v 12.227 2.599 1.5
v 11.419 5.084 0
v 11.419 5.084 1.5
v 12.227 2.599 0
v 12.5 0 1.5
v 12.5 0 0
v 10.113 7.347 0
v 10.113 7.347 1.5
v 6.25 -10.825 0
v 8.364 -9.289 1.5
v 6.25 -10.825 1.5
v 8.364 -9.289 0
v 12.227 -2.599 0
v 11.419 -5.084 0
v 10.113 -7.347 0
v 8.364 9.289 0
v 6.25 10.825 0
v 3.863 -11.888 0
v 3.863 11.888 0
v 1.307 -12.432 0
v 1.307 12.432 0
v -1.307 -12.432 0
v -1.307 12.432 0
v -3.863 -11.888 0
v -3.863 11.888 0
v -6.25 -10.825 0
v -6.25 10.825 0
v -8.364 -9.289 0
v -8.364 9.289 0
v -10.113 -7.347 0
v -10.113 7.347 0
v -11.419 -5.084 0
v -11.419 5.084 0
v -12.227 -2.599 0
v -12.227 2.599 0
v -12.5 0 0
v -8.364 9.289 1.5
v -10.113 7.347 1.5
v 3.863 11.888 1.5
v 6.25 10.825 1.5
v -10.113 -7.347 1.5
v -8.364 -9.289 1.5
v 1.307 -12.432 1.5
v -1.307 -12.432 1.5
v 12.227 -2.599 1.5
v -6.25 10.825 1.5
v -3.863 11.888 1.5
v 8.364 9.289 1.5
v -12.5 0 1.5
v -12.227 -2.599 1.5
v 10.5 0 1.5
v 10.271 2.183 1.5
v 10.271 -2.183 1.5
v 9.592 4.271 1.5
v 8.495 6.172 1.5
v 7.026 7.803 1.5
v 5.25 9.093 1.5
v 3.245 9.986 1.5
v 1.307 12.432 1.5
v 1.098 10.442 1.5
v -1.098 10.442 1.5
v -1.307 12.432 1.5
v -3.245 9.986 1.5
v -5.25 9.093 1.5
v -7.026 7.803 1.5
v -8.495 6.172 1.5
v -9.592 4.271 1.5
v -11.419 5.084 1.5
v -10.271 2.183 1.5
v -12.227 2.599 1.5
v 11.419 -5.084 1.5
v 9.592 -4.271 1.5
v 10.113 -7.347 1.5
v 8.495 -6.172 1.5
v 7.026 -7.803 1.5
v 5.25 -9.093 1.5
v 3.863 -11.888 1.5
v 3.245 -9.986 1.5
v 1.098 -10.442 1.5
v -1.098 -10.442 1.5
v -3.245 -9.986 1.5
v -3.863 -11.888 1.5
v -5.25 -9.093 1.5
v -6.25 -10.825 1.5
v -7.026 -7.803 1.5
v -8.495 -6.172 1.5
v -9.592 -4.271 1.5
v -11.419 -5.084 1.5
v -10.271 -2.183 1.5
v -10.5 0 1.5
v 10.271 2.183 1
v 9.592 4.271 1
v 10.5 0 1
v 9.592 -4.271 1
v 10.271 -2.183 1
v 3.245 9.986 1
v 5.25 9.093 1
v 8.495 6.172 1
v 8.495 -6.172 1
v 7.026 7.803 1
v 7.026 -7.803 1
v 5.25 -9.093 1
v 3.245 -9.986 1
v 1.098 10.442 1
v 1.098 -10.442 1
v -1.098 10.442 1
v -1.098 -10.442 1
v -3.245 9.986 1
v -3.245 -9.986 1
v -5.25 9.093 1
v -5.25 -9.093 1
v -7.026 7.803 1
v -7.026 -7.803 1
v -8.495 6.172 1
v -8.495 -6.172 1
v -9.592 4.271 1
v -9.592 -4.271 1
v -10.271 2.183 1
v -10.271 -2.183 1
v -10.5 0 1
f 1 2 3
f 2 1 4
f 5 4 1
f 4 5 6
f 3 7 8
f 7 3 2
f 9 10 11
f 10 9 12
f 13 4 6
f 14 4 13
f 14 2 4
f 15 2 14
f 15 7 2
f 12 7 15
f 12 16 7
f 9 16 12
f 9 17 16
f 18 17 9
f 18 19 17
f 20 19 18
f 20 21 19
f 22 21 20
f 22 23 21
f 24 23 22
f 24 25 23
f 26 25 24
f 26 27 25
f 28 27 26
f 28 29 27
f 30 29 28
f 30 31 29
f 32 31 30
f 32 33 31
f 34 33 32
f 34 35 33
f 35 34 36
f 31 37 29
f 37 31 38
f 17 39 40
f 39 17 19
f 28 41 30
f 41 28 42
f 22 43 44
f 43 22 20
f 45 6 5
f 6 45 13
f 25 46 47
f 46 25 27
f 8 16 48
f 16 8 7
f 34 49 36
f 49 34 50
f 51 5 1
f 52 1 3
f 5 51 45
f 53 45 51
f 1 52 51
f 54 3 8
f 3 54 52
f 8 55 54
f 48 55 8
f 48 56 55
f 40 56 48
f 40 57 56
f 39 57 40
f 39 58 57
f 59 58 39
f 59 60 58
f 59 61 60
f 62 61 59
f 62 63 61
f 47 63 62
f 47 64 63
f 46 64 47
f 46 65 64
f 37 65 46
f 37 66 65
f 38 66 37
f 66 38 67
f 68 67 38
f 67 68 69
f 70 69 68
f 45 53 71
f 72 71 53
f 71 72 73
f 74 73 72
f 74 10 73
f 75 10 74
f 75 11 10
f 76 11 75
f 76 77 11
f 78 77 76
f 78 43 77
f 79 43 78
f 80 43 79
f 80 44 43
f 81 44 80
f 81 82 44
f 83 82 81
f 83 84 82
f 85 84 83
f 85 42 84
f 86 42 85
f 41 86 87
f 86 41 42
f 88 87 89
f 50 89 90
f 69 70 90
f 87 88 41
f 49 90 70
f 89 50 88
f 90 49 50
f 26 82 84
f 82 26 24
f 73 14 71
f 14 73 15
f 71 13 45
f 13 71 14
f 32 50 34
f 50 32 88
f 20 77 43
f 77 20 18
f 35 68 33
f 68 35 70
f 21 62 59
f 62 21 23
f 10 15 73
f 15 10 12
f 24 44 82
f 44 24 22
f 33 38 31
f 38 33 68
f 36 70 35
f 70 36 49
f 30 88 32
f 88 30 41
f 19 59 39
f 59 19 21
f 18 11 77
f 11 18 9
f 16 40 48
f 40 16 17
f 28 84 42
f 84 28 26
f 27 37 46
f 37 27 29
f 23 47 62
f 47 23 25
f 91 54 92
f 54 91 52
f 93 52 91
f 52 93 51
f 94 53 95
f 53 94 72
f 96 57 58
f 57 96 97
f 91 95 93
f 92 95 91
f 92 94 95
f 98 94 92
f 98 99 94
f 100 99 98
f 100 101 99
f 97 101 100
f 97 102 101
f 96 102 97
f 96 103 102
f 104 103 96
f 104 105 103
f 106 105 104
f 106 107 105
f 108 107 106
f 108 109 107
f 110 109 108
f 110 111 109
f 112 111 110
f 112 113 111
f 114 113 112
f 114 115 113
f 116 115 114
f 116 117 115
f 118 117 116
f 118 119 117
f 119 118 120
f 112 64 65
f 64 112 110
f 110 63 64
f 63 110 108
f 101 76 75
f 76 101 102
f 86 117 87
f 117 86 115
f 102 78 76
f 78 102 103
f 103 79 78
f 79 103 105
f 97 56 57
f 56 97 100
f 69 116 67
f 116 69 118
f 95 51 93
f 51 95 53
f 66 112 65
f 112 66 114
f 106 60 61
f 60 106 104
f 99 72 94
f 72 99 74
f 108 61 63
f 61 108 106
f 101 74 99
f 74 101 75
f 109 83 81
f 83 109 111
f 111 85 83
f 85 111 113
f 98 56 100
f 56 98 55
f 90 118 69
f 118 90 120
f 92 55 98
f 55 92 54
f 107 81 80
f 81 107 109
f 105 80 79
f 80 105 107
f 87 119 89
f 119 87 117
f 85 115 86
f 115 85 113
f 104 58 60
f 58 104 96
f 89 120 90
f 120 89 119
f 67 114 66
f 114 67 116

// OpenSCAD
radius = 12.5;
wall = 2;

difference() {
    cylinder(1.5, radius, radius);
    translate([0, 0, 1]) cylinder(1, radius - wall, radius - wall);
}
